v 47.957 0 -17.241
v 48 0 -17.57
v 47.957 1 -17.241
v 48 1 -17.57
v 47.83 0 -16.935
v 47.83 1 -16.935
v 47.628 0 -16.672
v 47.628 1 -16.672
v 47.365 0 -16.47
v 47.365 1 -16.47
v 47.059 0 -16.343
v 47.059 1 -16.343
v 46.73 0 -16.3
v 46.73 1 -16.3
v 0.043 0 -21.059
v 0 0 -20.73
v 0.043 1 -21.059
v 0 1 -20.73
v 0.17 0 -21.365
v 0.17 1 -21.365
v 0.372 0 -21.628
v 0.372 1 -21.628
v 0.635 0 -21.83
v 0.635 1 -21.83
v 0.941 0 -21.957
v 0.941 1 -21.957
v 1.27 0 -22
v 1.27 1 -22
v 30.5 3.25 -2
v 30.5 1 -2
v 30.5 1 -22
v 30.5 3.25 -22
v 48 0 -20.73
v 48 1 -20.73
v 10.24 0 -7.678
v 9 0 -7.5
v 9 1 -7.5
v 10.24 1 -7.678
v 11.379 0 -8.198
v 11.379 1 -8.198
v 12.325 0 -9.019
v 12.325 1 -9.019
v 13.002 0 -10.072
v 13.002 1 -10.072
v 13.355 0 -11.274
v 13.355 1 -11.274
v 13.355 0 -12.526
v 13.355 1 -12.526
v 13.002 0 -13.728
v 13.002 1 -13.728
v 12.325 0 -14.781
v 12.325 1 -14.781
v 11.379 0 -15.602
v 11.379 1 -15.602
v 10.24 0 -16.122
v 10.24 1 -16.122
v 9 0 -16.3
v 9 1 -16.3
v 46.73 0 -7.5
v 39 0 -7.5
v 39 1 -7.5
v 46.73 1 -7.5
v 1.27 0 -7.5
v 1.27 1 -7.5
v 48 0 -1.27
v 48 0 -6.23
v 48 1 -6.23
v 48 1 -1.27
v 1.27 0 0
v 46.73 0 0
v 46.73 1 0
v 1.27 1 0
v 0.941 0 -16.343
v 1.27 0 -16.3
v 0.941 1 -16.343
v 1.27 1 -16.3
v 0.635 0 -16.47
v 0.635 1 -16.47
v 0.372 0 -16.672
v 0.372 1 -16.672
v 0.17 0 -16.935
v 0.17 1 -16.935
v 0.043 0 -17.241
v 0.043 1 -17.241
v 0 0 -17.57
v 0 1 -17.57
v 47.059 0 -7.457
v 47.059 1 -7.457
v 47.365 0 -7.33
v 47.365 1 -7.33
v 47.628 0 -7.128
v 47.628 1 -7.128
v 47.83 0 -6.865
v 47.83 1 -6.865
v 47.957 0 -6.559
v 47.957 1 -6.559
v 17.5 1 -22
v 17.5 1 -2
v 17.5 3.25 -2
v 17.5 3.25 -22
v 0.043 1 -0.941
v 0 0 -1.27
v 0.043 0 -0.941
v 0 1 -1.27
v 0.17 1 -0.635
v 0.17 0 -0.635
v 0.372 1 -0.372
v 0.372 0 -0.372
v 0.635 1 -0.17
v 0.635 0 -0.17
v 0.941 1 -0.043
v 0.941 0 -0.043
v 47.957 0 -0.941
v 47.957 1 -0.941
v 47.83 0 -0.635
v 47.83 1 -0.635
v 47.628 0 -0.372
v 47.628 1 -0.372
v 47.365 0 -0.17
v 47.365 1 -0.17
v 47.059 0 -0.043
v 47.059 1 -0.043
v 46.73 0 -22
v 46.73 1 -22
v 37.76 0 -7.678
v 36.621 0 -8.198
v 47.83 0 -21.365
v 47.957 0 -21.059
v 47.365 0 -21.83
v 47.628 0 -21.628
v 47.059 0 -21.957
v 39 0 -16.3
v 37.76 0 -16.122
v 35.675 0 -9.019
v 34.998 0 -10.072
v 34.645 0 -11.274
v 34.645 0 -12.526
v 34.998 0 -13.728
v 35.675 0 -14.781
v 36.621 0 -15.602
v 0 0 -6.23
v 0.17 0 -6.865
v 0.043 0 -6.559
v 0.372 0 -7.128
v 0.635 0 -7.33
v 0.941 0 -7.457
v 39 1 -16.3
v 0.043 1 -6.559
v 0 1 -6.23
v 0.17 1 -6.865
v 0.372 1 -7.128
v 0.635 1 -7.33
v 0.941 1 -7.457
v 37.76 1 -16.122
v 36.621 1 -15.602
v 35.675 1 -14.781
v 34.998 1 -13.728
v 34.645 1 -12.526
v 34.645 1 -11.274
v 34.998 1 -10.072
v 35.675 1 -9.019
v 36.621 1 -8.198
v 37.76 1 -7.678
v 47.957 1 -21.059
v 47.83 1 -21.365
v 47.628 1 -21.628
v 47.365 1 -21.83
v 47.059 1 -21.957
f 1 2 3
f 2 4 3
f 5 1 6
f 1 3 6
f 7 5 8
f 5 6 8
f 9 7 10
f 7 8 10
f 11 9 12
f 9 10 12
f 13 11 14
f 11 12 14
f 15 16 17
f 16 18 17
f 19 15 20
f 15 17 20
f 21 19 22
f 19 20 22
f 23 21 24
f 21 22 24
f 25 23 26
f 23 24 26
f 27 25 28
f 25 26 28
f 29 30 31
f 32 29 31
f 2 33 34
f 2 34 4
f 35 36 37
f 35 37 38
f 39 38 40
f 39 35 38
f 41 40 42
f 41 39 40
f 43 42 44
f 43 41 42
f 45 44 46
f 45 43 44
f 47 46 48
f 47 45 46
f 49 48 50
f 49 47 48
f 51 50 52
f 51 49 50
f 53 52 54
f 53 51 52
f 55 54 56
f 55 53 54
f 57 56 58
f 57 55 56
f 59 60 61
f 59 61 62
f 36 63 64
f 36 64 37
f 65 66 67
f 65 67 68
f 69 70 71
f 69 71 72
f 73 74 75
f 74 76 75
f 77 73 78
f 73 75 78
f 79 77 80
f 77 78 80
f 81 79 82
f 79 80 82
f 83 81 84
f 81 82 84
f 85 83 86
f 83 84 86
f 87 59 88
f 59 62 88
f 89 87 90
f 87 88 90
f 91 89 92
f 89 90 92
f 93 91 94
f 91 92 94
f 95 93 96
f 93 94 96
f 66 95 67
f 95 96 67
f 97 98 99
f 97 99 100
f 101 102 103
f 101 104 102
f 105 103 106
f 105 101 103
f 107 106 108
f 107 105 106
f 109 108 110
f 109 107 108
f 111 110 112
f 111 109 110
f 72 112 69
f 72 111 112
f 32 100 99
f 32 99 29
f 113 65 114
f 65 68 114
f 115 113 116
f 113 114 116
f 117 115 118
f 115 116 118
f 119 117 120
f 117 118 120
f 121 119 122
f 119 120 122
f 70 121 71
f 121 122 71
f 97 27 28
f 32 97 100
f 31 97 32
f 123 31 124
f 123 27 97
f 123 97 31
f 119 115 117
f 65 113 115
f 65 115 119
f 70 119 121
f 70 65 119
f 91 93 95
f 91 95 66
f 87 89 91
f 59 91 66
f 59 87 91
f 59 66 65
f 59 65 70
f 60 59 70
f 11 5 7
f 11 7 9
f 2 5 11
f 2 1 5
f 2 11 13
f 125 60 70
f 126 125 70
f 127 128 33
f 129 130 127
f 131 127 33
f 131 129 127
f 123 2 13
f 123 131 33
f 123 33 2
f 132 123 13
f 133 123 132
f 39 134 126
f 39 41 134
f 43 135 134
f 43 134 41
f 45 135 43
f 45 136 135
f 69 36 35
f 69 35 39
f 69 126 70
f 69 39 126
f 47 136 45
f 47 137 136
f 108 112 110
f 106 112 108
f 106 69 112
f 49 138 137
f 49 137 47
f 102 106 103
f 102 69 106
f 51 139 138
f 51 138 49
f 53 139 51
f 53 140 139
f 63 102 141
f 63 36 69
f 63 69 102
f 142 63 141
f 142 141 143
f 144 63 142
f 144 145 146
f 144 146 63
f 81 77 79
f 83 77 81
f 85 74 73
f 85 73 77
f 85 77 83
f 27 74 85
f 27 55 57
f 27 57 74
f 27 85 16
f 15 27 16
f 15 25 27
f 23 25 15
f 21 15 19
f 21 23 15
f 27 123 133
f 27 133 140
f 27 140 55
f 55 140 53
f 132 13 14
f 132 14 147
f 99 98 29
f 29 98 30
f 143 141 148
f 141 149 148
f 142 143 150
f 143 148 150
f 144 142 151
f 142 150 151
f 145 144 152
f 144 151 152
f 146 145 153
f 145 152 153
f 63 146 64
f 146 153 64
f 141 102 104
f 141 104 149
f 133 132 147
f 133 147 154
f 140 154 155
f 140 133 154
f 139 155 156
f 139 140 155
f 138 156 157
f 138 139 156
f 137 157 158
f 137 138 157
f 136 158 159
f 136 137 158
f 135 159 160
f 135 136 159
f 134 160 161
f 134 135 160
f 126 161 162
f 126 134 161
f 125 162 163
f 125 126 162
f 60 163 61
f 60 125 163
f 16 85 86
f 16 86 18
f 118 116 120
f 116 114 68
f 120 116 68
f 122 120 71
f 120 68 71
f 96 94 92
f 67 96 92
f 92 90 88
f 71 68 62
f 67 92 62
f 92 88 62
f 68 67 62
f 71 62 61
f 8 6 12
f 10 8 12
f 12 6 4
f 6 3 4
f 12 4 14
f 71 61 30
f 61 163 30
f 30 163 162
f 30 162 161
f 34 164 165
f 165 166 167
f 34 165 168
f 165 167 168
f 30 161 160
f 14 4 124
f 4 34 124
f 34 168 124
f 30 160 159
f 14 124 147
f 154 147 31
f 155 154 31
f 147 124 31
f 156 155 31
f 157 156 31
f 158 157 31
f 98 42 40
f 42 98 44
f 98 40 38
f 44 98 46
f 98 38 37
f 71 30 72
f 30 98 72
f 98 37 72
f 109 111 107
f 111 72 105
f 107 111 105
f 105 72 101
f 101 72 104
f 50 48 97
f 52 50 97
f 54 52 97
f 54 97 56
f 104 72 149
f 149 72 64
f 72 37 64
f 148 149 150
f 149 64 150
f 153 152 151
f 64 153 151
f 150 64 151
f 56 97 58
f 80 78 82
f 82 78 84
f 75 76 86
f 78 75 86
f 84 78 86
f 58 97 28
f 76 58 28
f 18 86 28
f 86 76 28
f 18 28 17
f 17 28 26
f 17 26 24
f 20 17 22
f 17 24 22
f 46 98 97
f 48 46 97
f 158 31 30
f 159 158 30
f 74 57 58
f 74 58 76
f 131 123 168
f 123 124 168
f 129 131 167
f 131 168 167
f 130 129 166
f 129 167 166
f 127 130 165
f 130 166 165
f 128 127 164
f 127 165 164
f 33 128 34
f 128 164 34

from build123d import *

# Parameters (mm, degrees)
BOSS_EXTRUDE1_DEPTH = 1
FILLET1_R           = 1.27
SKETCH2_W           = 13
SKETCH2_H           = 20
BOSS_EXTRUDE2_DEPTH = 2.25


with BuildPart() as part:
    # Sketch1 → Boss-Extrude1 (new body)
    with BuildSketch(Plane(origin=(0, 0, 0), x_dir=(1, 0, 0), z_dir=(0, 1, 0))):
        with BuildLine():
            Line((0, 0), (0, 7.5))
            Line((0, 7.5), (9, 7.5))
            ThreePointArc((9, 7.5), (13.4, 11.9), (9, 16.3))
            Line((9, 16.3), (0, 16.3))
            Line((0, 16.3), (0, 22))
            Line((0, 22), (48, 22))
            Line((48, 22), (48, 16.3))
            Line((48, 16.3), (39, 16.3))
            ThreePointArc((39, 16.3), (34.6, 11.9), (39, 7.5))
            Line((39, 7.5), (48, 7.5))
            Line((48, 7.5), (48, 0))
            Line((48, 0), (0, 0))
        make_face()
    extrude(amount=BOSS_EXTRUDE1_DEPTH)

    # Fillet1
    fillet1_edges = [part.edges().sort_by_distance(p)[0] for p in [
        (0, 0.5, 0),
        (0, 0.5, -7.5),
        (0, 0.5, -16.3),
        (0, 0.5, -22),
        (48, 0.5, -22),
        (48, 0.5, -16.3),
        (48, 0.5, -7.5),
        (48, 0.5, 0),
    ]]
    fillet(fillet1_edges, radius=FILLET1_R)

    # Sketch2 → Boss-Extrude2 (add)
    with BuildSketch(Plane(origin=(0, 1, 0), x_dir=(1, 0, 0), z_dir=(0, 1, 0))):
        with Locations((24, 12)):
            Rectangle(SKETCH2_W, SKETCH2_H)
    extrude(amount=BOSS_EXTRUDE2_DEPTH)


solid = part.part
